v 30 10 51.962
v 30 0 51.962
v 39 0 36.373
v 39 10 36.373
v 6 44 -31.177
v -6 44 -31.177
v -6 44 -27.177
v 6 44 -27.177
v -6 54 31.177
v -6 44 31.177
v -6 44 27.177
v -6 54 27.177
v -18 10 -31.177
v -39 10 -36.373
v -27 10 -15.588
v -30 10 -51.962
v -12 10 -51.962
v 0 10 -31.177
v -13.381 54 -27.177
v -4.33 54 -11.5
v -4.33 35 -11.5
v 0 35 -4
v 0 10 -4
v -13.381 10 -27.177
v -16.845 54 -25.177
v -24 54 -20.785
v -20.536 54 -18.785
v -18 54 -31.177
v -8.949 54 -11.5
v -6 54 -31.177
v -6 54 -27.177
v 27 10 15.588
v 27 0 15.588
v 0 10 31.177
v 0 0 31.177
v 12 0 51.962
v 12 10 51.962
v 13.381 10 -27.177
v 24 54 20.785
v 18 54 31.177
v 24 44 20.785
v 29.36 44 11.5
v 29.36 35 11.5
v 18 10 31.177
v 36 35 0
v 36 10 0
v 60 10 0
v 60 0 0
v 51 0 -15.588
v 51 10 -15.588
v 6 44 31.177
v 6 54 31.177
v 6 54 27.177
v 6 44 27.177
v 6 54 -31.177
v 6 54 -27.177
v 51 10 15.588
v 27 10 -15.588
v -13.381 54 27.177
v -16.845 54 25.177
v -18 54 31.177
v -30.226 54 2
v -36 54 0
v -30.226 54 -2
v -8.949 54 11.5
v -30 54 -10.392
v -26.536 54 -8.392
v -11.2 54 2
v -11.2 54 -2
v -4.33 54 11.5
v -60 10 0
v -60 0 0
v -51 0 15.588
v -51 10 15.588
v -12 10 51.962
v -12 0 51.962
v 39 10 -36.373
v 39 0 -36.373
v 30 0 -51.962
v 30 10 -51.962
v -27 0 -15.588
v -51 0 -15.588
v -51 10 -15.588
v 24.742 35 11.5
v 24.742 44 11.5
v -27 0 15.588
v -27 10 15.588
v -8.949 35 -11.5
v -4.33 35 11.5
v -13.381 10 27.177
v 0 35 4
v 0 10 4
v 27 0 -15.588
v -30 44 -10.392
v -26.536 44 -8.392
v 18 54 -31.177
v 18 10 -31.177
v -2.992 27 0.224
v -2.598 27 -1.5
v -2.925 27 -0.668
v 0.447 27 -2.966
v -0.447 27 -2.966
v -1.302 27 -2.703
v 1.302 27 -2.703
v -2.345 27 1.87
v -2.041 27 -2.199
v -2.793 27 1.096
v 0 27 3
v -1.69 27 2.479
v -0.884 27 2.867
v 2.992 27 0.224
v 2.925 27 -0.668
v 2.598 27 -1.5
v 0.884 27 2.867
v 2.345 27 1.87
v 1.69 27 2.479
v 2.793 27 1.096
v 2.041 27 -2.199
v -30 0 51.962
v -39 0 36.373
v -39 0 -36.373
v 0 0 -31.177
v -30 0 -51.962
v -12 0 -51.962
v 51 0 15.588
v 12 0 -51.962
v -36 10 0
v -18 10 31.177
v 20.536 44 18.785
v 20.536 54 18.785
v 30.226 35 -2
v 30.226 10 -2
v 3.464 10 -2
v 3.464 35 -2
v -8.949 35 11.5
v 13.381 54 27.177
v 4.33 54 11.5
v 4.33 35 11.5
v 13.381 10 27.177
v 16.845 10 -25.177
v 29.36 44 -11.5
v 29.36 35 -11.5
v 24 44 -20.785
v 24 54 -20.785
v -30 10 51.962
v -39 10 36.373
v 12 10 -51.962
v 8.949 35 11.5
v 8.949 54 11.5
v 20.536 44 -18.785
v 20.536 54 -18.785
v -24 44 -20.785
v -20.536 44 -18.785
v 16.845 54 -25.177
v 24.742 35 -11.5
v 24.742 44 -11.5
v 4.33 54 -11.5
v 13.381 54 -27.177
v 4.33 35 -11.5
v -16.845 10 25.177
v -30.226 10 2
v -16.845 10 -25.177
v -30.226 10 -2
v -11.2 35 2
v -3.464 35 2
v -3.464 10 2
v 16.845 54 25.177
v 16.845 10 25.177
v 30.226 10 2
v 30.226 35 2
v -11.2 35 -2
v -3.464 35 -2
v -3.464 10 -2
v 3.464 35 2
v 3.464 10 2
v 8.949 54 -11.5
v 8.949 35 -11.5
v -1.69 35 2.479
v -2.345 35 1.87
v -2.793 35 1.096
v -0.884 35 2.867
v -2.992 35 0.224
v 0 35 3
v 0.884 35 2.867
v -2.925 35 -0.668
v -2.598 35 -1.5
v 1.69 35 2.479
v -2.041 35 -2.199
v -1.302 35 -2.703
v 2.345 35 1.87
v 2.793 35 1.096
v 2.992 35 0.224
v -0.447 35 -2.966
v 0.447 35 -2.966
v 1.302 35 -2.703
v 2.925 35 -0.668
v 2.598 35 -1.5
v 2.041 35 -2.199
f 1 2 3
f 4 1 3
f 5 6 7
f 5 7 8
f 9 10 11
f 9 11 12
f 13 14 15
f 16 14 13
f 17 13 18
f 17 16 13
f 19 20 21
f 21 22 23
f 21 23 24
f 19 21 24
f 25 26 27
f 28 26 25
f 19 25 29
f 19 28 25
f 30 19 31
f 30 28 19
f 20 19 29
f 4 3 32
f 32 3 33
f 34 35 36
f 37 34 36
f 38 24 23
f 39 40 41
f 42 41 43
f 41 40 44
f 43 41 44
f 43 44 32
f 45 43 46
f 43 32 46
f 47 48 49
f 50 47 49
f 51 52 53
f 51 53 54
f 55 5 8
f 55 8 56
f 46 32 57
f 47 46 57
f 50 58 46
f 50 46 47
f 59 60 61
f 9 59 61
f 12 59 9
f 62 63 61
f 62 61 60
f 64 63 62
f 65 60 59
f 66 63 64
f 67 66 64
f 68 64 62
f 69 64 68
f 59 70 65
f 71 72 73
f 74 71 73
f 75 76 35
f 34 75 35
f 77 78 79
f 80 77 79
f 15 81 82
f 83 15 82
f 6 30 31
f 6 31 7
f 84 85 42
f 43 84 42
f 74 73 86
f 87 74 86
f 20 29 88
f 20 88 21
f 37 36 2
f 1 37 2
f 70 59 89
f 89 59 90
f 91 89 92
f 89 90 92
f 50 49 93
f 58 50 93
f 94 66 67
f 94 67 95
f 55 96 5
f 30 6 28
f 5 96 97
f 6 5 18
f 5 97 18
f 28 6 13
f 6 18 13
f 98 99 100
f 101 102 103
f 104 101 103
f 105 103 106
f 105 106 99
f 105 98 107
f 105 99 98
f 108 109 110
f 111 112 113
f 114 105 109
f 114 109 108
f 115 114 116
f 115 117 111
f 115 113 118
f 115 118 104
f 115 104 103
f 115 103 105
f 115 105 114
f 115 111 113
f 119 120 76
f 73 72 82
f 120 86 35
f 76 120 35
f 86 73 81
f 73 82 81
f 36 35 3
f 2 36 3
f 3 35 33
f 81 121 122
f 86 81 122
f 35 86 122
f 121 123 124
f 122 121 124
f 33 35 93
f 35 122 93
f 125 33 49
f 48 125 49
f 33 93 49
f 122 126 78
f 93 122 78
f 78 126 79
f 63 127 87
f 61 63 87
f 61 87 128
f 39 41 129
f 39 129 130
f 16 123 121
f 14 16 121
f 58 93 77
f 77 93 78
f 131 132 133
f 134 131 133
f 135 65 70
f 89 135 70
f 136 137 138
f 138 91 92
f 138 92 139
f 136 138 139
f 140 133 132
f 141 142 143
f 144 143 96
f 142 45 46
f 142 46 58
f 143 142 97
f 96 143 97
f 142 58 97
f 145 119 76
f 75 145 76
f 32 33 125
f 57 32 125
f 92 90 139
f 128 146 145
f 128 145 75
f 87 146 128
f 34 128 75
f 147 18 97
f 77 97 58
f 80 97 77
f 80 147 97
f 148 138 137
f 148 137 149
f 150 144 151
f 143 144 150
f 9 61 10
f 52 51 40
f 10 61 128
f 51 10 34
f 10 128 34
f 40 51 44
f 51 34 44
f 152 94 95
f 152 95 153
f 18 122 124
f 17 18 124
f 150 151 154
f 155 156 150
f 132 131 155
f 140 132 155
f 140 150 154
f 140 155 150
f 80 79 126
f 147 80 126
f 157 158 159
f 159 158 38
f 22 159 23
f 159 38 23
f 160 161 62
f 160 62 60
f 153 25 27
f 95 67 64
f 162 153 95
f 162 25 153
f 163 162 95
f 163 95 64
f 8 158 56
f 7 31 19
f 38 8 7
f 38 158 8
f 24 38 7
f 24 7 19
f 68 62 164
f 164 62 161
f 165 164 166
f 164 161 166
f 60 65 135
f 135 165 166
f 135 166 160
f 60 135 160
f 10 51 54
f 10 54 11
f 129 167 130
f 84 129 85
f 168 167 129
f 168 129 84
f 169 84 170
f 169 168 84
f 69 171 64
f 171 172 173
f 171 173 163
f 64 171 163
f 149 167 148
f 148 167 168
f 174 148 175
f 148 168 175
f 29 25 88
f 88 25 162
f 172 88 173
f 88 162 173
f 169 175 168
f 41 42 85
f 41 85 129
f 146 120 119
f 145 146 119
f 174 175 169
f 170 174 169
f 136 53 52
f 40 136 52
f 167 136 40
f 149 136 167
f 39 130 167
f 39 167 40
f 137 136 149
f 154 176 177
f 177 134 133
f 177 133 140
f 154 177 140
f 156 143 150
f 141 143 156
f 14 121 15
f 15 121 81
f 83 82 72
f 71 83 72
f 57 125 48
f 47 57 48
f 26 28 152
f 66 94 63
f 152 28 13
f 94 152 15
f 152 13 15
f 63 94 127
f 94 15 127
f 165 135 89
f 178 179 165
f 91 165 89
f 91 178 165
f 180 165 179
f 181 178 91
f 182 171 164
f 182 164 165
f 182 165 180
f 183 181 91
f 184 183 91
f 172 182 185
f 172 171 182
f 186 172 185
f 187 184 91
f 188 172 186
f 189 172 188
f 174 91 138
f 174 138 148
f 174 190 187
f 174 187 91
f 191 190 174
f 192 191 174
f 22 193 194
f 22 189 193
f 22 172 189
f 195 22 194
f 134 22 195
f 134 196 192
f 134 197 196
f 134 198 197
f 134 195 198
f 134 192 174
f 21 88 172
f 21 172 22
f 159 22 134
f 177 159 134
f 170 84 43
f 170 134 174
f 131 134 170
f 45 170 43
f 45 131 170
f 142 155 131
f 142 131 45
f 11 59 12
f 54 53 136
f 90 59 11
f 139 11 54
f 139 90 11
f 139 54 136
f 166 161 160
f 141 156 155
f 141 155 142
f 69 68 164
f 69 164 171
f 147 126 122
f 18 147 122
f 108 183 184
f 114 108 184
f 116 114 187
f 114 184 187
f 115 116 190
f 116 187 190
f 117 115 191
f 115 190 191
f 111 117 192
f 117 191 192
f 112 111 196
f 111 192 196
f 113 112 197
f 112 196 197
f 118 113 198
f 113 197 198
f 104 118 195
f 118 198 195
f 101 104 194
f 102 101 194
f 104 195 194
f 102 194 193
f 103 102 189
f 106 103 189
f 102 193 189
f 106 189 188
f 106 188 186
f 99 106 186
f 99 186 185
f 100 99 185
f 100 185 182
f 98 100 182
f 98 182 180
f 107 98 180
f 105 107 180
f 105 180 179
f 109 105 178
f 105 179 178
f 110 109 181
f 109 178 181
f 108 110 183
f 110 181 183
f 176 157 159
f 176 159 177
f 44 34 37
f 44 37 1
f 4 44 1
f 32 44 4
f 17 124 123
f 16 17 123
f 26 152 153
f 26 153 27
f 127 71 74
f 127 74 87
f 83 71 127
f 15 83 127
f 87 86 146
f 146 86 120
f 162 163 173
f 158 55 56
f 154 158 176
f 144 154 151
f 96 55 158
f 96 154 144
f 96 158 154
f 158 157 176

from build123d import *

# Parameters (mm, degrees)
SALIENTE_EXTRUIR1_DEPTH = 10
SALIENTE_EXTRUIR2_DEPTH = 170
CORTAR_EXTRUIR1_DEPTH   = 4
MATRIZC1_COUNT          = 5
MATRIZC1_ANGLE          = 240
CROQUIS4_W              = 24
CROQUIS4_H              = 12
SALIENTE_EXTRUIR3_DEPTH = 36
CROQUIS5_W              = 24
CROQUIS5_H              = 9
CORTAR_EXTRUIR2_DEPTH   = 24
CHAFL_N1_SIZE2          = 36
CHAFL_N1_SIZE           = 98.9091871
CORTAR_EXTRUIR3_DEPTH   = 24
CROQUIS7_W              = 30
CROQUIS7_H              = 18
CROQUIS7_R              = 3
SALIENTE_EXTRUIR4_DEPTH = 3
CROQUIS8_W              = 150
CROQUIS8_H              = 150
CORTAR_EXTRUIR4_DEPTH   = 130
CROQUIS9_W              = 64.5
CROQUIS9_H              = 23
CORTAR_EXTRUIR5_DEPTH   = 19
CROQUIS10_R             = 3
CORTAR_EXTRUIR6_DEPTH   = 8


with BuildPart() as part:
    # Croquis1 → Saliente-Extruir1 (new body)
    with BuildSketch(Plane(origin=(0, 0, 0), x_dir=(1, 0, 0), z_dir=(0, 1, 0))):
        Polygon((-12, 51.961524227), (-30, 51.961524227), (-39, 36.373066959), (-27, 15.588457268), (-51, 15.588457268), (-60, 0), (-51, -15.588457268), (-27, -15.588457268), (-39, -36.373066959), (-30, -51.961524227), (-12, -51.961524227), (0, -31.176914536), (12, -51.961524227), (30, -51.961524227), (39, -36.373066959), (27, -15.588457268), (51, -15.588457268), (60, 0), (51, 15.588457268), (27, 15.588457268), (39, 36.373066959), (30, 51.961524227), (12, 51.961524227), (0, 31.176914536), align=None)
    extrude(amount=SALIENTE_EXTRUIR1_DEPTH)

    # Croquis2 → Saliente-Extruir2 (add)
    # profile 1 of 2: a face of its own
    with BuildSketch(Plane(origin=(0, 10, 0), x_dir=(1, 0, 0), z_dir=(0, 1, 0))):
        Polygon((36, 0), (18, 31.176914536), (-18, 31.176914536), (-36, 0), (-18, -31.176914536), (18, -31.176914536), align=None)
        Polygon((15.690598923, 27.176914536), (-15.690598923, 27.176914536), (-31.381197846, 0), (-15.690598923, -27.176914536), (15.690598923, -27.176914536), (31.381197846, 0), align=None, mode=Mode.SUBTRACT)
    # profile 2 of 2: a face of its own
    with BuildSketch(Plane(origin=(0, 10, 0), x_dir=(1, 0, 0), z_dir=(0, 1, 0))):
        Polygon((-13.381197846, 27.176914536), (-15.690598923, 27.176914536), (-16.845299462, 25.176914536), (-3.464101615, 2), (-30.226497308, 2), (-31.381197846, 0), (-30.226497308, -2), (-3.464101615, -2), (-16.845299462, -25.176914536), (-15.690598923, -27.176914536), (-13.381197846, -27.176914536), (0, -4), (13.381197846, -27.176914536), (15.690598923, -27.176914536), (16.845299462, -25.176914536), (3.464101615, -2), (30.226497308, -2), (31.381197846, 0), (30.226497308, 2), (3.464101615, 2), (16.845299462, 25.176914536), (15.690598923, 27.176914536), (13.381197846, 27.176914536), (0, 4), align=None)
    extrude(amount=SALIENTE_EXTRUIR2_DEPTH)

    # Croquis3 → Cortar-Extruir1 (cut)
    with BuildSketch(Plane.XY.offset(31.176914536)):
        Polygon((-14, 172), (-2, 172), (6, 164), (6, 44), (-6, 44), (-6, 159.029437252), (-6.970562748, 160), (-14, 160), align=None)
    cortar_extruir1 = extrude(amount=-CORTAR_EXTRUIR1_DEPTH, mode=Mode.SUBTRACT)

    # MatrizC1: Cortar-Extruir1 ×5 about axis
    matrizc1_axis = Axis((0, 0, 0), (0, 1, 0))
    for i in range(1, MATRIZC1_COUNT):
        add(cortar_extruir1.rotate(matrizc1_axis, i * MATRIZC1_ANGLE / (MATRIZC1_COUNT - 1)), mode=Mode.SUBTRACT)

    # Croquis4 → Saliente-Extruir3 (add)
    with BuildSketch(Plane(origin=(-27, 0, 15.588457268), x_dir=(0.5000000000000002, 0, 0.8660254037844386), z_dir=(-0.8660254037844386, 0, 0.5000000000000002))):
        with Locations((0, 172)):
            Rectangle(CROQUIS4_W, CROQUIS4_H)
    extrude(amount=SALIENTE_EXTRUIR3_DEPTH)

    # Croquis5 → Cortar-Extruir2 (cut)
    with BuildSketch(Plane(origin=(-58.176914536, 0, 33.588457268), x_dir=(0.5000000000000003, 0, 0.8660254037844386), z_dir=(-0.8660254037844385, 0, 0.5000000000000002))):
        with Locations((0, 173.5)):
            Rectangle(CROQUIS5_W, CROQUIS5_H)
    extrude(amount=-CORTAR_EXTRUIR2_DEPTH, mode=Mode.SUBTRACT)

    # Chaflán1
    chafl_n1_edges = [part.edges().sort_by_distance(p)[0] for p in [
        (-27, 166, 15.588457268),
    ]]
    chafl_n1_side = [part.faces().sort_by_distance(p)[0] for p in [
        (-27, 165.28, 15.588457268),
    ]]
    chamfer(chafl_n1_edges, length=CHAFL_N1_SIZE - 0.0001, length2=CHAFL_N1_SIZE2 - 0.0001, reference=chafl_n1_side[0])  # a hair under: the kernel refuses the full size

    # Croquis6 → Cortar-Extruir3 (cut)
    with BuildSketch(Plane(origin=(-6, 0, -10.392304845), x_dir=(-0.8660254037844385, 0, 0.5000000000000003), z_dir=(-0.5000000000000003, 0, -0.8660254037844385))):
        Polygon((58.663492356, 166), (31.176914536, 90.481248101), (31.176914536, 166), align=None)
    extrude(amount=-CORTAR_EXTRUIR3_DEPTH, mode=Mode.SUBTRACT)

    # Croquis7 → Saliente-Extruir4 (add)
    with BuildSketch(Plane(origin=(-58.176914536, 0, 33.588457268), x_dir=(0.5000000000000003, 0, 0.8660254037844386), z_dir=(-0.8660254037844385, 0, 0.5000000000000002))):
        with Locations((-3, 175)):
            Rectangle(CROQUIS7_W, CROQUIS7_H)
        with Locations((-3, 175)):
            Circle(CROQUIS7_R, mode=Mode.SUBTRACT)
    extrude(amount=-SALIENTE_EXTRUIR4_DEPTH)

    # Croquis8 → Cortar-Extruir4 (cut)
    with BuildSketch(Plane(origin=(0, 184, 0), x_dir=(1, 0, 0), z_dir=(0, 1, 0))):
        Rectangle(CROQUIS8_W, CROQUIS8_H)
    extrude(amount=-CORTAR_EXTRUIR4_DEPTH, mode=Mode.SUBTRACT)

    # Croquis9 → Cortar-Extruir5 (cut)
    with BuildSketch(Plane(origin=(0, 54, 0), x_dir=(1, 0, 0), z_dir=(0, 1, 0))):
        with Locations((21.05, 0)):
            Rectangle(CROQUIS9_W, CROQUIS9_H)
    extrude(amount=-CORTAR_EXTRUIR5_DEPTH, mode=Mode.SUBTRACT)

    # Croquis10 → Cortar-Extruir6 (cut)
    with BuildSketch(Plane(origin=(0, 35, 0), x_dir=(1, 0, 0), z_dir=(0, 1, 0))):
        with Locations(Location((0, 0, 0), (0, 0, 270))):
            Circle(CROQUIS10_R)
    extrude(amount=-CORTAR_EXTRUIR6_DEPTH, mode=Mode.SUBTRACT)


solid = part.part
